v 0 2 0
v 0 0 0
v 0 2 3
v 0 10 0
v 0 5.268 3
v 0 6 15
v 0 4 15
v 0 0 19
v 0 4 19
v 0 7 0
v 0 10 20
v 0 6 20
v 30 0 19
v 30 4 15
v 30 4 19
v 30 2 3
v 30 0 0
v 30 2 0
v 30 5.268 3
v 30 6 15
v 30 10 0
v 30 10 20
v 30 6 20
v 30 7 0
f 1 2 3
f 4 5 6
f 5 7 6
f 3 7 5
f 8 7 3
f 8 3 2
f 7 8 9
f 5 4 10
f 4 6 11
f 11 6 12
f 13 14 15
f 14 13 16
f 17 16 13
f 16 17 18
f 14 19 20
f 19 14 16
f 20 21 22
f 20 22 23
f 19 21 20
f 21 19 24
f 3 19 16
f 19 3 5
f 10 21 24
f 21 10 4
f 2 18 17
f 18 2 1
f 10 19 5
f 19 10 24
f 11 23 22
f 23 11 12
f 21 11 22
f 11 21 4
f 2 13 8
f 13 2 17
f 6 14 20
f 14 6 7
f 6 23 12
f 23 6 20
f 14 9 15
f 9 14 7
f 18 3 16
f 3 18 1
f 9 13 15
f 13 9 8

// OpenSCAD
mount_base = 30;
mount_thickness = 10;
mount_height = 20;

slit_thickness = 2;
slit_depth = 5;

monitor_thickness = 5;
interface_depth = 3;
interface_offset = 2;

slope_base = 2;
monitor_slope_angle = 45;

cutout_width = 2;
cutout_height = 1;

groove_height = interface_depth;
slope_angle = 60;
groove_base =  groove_height / tan(slope_angle);
groove_slope = sqrt(groove_height^2 + groove_base^2);

interface_thickness = monitor_thickness - groove_base;

difference() {
    cube([mount_base, mount_thickness, mount_height]);

    color("green")
    translate([0, mount_thickness / 2 - slit_thickness / 2, mount_height - slit_depth])
        cube([mount_base, slit_thickness, slit_depth]);
    
    color("red")
    translate([0, interface_offset, 0])
        cube([mount_base, interface_thickness + 0.1^5, interface_depth]);

    pyramid();
    
    color("purple")
    translate([0, 0, mount_height - cutout_height])
        cube([mount_base + 2, mount_thickness / 2 - slit_thickness / 2, cutout_height]);
    
}

module pyramid() {
    translate([mount_base, groove_base + interface_offset + interface_thickness, 0]) {
        rotate([90, 0, 270]) {
            difference(){
                color("brown")
                cube([groove_base, groove_height, mount_base]);
                translate([0, 0, 0]){
                    rotate([0, 0, slope_angle]){
                        cube([groove_slope, 20, mount_base]);
                    }
               }
            }
        }
    }
}
